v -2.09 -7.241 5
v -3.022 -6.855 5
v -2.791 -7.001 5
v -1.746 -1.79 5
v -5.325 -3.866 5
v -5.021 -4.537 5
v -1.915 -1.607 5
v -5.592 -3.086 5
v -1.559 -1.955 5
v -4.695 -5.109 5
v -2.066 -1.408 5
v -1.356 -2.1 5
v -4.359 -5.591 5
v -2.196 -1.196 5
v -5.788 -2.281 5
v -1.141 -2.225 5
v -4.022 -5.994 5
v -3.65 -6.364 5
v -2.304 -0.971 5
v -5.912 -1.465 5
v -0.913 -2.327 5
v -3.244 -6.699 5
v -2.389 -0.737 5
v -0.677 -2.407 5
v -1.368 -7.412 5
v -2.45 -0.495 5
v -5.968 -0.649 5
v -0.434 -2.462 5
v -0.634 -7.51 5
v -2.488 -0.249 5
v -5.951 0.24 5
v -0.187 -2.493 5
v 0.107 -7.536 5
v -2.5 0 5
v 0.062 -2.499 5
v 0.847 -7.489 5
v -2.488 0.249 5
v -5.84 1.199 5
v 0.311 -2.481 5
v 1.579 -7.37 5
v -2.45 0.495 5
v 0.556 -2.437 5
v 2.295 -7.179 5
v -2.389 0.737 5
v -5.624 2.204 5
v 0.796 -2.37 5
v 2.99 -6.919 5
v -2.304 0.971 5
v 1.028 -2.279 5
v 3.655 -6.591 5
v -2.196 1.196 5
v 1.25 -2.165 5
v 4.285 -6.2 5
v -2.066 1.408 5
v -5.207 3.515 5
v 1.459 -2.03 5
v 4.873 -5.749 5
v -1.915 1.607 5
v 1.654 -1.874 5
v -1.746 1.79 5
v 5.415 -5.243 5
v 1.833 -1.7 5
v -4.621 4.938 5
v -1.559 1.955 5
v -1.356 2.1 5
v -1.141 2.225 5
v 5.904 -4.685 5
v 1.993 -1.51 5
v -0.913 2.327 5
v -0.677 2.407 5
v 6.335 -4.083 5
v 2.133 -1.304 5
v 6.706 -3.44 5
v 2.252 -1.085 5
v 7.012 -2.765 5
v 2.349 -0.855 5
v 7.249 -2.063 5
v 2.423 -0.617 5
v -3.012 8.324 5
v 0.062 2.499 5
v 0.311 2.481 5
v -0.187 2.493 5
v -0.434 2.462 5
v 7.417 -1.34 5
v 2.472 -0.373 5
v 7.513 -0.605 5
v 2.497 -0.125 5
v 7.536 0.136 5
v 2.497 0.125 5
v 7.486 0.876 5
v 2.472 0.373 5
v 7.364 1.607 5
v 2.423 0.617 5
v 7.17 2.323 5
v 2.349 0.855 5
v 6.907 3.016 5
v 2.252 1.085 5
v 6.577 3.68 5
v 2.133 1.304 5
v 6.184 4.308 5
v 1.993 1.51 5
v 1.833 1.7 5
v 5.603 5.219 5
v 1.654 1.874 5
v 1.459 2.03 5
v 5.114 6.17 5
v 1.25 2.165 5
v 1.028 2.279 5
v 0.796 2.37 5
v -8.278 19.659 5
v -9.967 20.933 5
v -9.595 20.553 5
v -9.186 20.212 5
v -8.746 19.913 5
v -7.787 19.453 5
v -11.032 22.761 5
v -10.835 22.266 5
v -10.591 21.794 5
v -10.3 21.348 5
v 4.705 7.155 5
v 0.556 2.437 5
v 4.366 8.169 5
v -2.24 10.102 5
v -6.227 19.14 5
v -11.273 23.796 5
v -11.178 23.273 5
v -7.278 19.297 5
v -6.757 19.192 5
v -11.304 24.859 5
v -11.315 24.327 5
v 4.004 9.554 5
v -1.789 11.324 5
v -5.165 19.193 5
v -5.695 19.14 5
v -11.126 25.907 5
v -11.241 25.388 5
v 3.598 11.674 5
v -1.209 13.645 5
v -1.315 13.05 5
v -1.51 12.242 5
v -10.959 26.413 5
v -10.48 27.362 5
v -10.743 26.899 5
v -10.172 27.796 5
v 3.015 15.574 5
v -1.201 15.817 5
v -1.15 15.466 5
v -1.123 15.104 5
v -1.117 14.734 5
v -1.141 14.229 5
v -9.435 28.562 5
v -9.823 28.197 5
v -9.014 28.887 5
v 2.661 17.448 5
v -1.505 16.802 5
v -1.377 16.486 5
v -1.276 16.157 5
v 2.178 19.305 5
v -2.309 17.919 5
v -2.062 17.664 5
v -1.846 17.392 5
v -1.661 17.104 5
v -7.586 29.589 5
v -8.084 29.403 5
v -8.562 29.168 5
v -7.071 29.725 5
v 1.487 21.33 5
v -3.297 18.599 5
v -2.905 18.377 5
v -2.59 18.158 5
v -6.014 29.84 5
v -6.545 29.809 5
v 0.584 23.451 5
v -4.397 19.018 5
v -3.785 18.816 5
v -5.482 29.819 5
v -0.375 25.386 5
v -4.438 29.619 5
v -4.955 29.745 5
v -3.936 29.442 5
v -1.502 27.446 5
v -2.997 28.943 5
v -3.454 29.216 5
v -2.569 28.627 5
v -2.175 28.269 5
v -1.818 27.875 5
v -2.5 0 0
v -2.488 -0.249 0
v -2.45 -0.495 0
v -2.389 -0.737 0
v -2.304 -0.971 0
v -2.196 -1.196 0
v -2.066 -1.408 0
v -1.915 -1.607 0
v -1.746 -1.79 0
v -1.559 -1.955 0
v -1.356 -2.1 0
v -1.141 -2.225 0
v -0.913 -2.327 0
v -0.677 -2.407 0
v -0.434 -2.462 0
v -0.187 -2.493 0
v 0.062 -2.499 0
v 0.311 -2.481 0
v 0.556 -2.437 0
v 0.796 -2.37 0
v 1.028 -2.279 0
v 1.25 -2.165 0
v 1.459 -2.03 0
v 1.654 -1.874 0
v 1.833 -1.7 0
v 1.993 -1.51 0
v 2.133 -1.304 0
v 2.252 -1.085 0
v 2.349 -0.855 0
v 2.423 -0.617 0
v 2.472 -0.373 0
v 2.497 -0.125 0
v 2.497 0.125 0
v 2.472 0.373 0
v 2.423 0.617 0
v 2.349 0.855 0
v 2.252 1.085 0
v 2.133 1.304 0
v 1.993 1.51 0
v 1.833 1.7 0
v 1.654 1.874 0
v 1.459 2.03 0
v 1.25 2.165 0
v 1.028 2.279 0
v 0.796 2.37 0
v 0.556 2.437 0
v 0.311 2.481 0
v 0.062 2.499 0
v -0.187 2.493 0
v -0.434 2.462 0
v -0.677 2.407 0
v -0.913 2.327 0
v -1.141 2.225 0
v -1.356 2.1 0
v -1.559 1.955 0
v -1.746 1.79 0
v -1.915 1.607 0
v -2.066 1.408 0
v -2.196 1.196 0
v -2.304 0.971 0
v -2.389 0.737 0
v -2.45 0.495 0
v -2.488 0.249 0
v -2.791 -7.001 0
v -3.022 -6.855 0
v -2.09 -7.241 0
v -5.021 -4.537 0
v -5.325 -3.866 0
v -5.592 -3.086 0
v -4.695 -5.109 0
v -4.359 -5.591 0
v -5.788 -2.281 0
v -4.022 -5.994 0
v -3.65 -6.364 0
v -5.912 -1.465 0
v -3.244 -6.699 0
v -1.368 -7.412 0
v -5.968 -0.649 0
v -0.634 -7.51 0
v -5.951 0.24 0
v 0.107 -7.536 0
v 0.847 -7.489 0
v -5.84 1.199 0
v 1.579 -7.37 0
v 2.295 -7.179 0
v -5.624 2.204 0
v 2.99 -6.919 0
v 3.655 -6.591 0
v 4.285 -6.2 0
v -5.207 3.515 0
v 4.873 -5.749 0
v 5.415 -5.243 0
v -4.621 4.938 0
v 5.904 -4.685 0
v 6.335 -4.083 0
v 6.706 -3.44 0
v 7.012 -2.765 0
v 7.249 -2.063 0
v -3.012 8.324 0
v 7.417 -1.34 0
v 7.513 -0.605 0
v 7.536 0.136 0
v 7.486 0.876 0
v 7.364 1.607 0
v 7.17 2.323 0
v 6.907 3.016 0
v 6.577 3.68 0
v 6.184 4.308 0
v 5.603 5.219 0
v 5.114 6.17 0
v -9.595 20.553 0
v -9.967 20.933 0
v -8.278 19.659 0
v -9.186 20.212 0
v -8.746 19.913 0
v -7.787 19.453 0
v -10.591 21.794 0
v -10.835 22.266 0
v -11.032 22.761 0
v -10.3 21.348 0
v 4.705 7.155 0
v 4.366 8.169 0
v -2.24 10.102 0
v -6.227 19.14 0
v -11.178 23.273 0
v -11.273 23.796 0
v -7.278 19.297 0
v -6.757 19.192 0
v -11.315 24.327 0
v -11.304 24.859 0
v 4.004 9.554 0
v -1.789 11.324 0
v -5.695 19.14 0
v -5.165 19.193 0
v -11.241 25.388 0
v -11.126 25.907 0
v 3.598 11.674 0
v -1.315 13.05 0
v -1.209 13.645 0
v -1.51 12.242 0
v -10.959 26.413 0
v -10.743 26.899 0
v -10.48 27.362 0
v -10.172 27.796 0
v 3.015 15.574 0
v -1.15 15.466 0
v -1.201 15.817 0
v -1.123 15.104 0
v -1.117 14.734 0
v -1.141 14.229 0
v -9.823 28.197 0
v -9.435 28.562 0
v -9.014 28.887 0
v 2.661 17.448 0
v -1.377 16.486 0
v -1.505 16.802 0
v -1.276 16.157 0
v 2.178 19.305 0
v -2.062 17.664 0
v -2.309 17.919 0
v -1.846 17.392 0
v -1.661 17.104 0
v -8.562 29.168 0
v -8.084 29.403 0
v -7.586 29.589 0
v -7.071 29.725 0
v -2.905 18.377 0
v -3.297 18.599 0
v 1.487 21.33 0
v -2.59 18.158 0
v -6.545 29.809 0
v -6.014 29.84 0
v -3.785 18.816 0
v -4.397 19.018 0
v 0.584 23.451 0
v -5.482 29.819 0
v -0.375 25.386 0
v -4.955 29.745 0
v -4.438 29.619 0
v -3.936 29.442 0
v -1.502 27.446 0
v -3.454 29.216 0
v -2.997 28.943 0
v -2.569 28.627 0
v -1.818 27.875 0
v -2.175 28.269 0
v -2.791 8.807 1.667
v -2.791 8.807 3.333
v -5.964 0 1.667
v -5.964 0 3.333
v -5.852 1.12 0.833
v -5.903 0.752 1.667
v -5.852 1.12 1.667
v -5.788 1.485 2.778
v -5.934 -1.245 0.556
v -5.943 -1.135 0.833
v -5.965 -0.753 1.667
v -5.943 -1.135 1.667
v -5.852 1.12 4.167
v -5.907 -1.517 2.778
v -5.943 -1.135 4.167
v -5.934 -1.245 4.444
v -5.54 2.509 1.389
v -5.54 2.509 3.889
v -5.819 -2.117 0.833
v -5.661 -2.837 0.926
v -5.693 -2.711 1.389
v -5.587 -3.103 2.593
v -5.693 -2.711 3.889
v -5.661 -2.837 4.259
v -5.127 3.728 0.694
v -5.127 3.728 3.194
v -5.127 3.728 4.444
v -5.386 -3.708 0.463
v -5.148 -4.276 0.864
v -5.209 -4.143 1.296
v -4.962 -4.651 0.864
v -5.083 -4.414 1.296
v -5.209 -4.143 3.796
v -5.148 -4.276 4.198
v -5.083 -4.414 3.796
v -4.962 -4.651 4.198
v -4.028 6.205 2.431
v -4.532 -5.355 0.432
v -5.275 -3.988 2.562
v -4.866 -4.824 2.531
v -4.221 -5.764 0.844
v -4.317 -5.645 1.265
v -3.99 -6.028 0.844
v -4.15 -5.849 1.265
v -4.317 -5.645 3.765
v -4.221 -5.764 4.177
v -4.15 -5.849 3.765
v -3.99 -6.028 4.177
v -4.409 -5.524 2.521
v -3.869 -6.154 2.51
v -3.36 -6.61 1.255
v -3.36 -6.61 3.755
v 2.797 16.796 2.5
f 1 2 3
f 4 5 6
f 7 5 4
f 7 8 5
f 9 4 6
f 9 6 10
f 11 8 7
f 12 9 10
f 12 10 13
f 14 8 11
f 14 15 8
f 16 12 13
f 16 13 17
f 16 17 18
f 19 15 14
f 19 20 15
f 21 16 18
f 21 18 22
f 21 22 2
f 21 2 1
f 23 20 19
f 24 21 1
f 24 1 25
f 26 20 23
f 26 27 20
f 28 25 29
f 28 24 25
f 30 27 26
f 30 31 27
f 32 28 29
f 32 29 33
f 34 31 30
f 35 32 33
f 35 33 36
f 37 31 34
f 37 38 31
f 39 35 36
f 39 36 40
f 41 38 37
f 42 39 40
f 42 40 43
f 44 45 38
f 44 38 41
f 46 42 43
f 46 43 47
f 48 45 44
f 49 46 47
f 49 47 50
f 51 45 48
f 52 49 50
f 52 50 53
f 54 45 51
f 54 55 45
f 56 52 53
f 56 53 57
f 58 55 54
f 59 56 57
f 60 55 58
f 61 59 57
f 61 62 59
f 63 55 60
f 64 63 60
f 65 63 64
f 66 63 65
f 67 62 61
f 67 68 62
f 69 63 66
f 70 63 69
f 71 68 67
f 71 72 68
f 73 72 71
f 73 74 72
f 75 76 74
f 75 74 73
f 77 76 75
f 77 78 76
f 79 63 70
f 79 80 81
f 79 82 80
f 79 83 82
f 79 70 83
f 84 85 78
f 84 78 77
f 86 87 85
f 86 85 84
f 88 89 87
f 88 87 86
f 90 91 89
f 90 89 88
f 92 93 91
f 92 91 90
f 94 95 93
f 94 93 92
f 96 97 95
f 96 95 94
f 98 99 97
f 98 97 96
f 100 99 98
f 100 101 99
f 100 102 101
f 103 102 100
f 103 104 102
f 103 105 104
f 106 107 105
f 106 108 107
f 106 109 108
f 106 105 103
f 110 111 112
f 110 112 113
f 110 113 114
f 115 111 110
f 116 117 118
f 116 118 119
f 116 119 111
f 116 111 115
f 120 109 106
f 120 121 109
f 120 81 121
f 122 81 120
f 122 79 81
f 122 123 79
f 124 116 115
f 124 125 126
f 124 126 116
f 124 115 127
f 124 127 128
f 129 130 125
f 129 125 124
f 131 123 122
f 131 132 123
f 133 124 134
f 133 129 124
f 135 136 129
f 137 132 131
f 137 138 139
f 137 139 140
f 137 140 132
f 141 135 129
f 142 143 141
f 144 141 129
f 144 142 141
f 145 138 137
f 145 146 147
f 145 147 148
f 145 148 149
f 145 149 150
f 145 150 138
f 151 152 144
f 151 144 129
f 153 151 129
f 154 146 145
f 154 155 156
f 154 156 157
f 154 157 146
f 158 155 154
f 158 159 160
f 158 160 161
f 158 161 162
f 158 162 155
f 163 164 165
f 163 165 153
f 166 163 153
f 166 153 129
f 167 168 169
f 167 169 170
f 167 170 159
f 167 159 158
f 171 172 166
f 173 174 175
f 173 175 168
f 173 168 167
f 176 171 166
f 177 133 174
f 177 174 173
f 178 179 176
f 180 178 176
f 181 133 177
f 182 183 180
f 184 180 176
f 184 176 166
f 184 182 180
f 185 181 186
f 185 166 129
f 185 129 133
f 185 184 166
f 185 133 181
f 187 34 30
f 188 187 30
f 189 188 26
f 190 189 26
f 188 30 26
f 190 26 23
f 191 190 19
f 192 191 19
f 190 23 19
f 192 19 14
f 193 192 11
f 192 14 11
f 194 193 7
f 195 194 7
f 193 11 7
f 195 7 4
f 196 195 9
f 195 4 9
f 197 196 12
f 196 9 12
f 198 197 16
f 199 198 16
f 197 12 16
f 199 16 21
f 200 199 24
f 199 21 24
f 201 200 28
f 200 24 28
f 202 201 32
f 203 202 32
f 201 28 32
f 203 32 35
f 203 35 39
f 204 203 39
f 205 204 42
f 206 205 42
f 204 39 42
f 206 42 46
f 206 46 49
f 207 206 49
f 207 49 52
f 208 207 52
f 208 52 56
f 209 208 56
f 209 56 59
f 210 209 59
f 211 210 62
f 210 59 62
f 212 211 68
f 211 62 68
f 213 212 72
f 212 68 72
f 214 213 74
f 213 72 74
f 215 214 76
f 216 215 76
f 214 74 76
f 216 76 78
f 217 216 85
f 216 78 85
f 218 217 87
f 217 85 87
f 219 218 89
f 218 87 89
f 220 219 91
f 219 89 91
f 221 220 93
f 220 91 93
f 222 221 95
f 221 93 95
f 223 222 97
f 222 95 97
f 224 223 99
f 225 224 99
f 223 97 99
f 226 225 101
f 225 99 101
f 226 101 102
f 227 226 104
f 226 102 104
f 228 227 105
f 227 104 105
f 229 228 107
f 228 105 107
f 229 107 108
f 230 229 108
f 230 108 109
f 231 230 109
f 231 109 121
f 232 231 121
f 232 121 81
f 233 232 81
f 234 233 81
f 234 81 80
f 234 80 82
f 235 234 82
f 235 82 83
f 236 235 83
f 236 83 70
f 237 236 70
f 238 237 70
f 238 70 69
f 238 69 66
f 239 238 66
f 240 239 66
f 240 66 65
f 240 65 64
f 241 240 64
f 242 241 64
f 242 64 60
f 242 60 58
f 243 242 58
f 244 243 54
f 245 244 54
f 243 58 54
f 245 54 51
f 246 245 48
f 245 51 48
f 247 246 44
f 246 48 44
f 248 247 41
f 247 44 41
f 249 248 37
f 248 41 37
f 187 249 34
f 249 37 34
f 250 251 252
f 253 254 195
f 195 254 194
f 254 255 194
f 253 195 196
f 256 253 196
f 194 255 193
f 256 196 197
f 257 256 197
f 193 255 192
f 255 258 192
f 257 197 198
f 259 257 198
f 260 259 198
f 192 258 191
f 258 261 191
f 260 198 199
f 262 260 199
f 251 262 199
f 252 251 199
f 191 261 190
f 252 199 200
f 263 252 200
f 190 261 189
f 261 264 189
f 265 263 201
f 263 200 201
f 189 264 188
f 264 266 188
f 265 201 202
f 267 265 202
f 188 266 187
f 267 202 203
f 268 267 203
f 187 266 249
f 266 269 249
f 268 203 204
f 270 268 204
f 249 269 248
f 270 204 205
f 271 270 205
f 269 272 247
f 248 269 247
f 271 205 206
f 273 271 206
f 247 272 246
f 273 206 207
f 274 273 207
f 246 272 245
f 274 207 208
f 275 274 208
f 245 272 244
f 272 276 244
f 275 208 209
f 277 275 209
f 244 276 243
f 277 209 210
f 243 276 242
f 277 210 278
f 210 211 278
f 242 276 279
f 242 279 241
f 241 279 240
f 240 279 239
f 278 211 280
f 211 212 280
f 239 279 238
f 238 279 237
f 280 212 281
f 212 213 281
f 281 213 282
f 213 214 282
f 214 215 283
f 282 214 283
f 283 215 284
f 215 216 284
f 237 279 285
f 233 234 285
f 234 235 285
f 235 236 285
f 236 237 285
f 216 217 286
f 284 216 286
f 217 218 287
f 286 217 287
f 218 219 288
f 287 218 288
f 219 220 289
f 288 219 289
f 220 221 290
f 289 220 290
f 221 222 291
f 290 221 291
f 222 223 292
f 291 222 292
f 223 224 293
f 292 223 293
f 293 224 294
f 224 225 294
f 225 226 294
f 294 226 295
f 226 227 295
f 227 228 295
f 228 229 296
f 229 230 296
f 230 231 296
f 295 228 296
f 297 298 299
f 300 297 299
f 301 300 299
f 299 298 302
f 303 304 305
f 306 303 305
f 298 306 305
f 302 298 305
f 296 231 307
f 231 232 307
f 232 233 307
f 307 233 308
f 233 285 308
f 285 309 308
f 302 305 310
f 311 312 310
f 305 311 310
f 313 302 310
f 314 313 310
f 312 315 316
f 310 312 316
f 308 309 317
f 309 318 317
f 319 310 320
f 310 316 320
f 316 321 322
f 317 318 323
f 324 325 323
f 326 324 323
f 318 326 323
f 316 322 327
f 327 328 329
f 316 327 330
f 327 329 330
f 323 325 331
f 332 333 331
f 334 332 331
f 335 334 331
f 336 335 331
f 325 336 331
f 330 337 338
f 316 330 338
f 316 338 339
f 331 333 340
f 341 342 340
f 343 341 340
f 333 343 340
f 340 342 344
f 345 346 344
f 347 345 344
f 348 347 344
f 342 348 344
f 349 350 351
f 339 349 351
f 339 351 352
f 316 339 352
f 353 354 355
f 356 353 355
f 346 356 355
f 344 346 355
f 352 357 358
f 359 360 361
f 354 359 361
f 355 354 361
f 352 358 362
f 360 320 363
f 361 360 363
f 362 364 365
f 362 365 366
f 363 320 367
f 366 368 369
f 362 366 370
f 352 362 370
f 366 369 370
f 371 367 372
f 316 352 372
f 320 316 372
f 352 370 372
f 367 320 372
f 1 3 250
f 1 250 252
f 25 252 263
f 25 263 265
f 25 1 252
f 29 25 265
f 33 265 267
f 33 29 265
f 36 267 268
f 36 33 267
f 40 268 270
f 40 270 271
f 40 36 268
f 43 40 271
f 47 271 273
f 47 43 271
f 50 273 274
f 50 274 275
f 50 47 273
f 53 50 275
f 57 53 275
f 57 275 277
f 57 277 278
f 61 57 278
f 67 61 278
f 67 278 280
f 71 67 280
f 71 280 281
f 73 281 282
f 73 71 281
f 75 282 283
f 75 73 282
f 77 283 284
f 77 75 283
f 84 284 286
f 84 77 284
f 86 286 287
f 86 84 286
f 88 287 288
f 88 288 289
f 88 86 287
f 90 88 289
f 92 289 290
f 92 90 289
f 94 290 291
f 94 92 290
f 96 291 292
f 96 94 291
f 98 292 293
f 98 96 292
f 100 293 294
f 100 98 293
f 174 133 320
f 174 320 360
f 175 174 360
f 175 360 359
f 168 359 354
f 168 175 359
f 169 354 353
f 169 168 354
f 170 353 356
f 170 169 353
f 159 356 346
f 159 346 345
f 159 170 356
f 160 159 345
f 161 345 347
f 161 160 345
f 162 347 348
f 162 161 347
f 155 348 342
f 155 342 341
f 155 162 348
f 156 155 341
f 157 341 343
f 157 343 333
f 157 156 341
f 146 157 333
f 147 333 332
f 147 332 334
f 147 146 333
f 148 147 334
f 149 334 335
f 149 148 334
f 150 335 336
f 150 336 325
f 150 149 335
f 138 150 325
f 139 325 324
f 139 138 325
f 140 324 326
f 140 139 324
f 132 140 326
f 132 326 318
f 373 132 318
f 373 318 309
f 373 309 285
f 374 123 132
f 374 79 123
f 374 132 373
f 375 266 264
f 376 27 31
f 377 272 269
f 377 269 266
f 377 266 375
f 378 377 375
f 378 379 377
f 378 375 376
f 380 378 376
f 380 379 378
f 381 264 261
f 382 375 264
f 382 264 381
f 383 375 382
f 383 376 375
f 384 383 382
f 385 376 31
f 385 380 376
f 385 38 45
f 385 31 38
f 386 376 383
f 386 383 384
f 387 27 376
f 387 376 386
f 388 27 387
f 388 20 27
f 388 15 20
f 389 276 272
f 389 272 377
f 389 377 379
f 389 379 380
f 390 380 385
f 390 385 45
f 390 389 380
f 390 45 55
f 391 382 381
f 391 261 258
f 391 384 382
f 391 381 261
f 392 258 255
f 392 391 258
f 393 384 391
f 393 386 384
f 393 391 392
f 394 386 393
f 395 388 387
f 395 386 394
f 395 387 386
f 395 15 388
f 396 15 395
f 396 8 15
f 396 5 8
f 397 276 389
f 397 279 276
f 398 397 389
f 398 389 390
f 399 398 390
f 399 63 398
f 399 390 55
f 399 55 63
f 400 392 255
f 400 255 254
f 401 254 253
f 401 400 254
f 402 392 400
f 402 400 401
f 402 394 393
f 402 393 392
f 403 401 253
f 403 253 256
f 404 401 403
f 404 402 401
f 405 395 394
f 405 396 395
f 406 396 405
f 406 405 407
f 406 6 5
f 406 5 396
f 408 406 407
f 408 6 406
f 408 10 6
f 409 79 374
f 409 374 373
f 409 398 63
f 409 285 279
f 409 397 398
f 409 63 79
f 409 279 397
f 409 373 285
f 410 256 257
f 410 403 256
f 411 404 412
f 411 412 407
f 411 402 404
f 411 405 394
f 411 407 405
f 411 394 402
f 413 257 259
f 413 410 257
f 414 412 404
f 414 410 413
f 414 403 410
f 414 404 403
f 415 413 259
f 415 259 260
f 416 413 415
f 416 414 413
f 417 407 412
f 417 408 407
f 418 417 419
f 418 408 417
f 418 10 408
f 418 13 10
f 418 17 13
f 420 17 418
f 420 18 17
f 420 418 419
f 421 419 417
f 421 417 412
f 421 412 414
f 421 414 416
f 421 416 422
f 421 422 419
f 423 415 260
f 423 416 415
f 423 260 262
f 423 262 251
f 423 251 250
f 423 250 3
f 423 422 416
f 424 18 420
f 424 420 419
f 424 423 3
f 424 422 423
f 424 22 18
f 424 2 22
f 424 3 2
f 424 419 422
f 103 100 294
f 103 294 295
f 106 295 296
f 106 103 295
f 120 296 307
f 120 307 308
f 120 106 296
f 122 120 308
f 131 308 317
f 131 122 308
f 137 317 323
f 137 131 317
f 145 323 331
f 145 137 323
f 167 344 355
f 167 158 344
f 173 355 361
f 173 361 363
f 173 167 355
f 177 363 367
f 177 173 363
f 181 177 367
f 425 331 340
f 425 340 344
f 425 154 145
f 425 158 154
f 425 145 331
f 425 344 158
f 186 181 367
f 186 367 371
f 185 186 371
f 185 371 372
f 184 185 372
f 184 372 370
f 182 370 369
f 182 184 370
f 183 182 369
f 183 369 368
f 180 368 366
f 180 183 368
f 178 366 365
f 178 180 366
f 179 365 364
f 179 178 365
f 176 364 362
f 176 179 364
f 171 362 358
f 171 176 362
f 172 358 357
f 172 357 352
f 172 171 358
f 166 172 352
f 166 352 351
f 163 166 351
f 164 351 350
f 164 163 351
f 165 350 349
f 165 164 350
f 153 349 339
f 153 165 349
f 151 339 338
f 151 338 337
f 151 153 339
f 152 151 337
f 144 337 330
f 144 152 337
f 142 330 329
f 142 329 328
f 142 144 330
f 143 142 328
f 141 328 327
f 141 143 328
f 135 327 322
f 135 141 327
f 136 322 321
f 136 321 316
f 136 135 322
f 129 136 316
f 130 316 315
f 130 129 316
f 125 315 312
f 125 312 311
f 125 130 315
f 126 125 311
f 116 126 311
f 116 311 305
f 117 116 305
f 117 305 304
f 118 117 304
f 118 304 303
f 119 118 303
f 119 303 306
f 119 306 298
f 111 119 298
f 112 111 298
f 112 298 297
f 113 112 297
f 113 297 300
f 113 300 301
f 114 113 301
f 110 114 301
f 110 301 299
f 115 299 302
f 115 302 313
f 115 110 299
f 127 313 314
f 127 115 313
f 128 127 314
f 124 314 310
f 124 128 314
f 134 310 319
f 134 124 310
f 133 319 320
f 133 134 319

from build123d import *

# Parameters (mm, degrees)
CROQUIS1_R              = 2.499999999
SALIENTE_EXTRUIR1_DEPTH = 5


with BuildPart() as part:
    # Croquis1 → Saliente-Extruir1 (new body)
    with BuildSketch(Plane.XY.offset(5)):
        with BuildLine():
            ThreePointArc((-1.502391268, 27.446296254), (-10.857150944, 26.658474231), (-5.165151301, 19.192998211))
            add(Edge.make_bspline(
                [(-5.165151301, 19.192998211), (0.561959139, 18.161248815), (-2.0209311, 9.093501776), (-7.220176541, 0.935588497), (-5.098734301, -5.629541665), (-2.791423521, -7.000958644)],
                knots=[0, 0, 0, 0, 0.419324493, 0.73408421, 1, 1, 1, 1], degree=3))
            ThreePointArc((-2.791423521, -7.000958644), (5.90367611, -4.685304218), (6.184039559, 4.308494165))
            add(Edge.make_bspline(
                [(6.184039559, 4.308494165), (3.613892894, 7.929527917), (3.595744884, 16.916271928), (0.755595428, 23.472120645), (-1.502391268, 27.446296254)],
                knots=[0, 0, 0, 0, 0.531518306, 1, 1, 1, 1], degree=3))
        make_face()
        with Locations(Location((1e-09, 1e-09, 0), (0, 0, 180))):
            Circle(CROQUIS1_R, mode=Mode.SUBTRACT)
    extrude(amount=-SALIENTE_EXTRUIR1_DEPTH)


solid = part.part
